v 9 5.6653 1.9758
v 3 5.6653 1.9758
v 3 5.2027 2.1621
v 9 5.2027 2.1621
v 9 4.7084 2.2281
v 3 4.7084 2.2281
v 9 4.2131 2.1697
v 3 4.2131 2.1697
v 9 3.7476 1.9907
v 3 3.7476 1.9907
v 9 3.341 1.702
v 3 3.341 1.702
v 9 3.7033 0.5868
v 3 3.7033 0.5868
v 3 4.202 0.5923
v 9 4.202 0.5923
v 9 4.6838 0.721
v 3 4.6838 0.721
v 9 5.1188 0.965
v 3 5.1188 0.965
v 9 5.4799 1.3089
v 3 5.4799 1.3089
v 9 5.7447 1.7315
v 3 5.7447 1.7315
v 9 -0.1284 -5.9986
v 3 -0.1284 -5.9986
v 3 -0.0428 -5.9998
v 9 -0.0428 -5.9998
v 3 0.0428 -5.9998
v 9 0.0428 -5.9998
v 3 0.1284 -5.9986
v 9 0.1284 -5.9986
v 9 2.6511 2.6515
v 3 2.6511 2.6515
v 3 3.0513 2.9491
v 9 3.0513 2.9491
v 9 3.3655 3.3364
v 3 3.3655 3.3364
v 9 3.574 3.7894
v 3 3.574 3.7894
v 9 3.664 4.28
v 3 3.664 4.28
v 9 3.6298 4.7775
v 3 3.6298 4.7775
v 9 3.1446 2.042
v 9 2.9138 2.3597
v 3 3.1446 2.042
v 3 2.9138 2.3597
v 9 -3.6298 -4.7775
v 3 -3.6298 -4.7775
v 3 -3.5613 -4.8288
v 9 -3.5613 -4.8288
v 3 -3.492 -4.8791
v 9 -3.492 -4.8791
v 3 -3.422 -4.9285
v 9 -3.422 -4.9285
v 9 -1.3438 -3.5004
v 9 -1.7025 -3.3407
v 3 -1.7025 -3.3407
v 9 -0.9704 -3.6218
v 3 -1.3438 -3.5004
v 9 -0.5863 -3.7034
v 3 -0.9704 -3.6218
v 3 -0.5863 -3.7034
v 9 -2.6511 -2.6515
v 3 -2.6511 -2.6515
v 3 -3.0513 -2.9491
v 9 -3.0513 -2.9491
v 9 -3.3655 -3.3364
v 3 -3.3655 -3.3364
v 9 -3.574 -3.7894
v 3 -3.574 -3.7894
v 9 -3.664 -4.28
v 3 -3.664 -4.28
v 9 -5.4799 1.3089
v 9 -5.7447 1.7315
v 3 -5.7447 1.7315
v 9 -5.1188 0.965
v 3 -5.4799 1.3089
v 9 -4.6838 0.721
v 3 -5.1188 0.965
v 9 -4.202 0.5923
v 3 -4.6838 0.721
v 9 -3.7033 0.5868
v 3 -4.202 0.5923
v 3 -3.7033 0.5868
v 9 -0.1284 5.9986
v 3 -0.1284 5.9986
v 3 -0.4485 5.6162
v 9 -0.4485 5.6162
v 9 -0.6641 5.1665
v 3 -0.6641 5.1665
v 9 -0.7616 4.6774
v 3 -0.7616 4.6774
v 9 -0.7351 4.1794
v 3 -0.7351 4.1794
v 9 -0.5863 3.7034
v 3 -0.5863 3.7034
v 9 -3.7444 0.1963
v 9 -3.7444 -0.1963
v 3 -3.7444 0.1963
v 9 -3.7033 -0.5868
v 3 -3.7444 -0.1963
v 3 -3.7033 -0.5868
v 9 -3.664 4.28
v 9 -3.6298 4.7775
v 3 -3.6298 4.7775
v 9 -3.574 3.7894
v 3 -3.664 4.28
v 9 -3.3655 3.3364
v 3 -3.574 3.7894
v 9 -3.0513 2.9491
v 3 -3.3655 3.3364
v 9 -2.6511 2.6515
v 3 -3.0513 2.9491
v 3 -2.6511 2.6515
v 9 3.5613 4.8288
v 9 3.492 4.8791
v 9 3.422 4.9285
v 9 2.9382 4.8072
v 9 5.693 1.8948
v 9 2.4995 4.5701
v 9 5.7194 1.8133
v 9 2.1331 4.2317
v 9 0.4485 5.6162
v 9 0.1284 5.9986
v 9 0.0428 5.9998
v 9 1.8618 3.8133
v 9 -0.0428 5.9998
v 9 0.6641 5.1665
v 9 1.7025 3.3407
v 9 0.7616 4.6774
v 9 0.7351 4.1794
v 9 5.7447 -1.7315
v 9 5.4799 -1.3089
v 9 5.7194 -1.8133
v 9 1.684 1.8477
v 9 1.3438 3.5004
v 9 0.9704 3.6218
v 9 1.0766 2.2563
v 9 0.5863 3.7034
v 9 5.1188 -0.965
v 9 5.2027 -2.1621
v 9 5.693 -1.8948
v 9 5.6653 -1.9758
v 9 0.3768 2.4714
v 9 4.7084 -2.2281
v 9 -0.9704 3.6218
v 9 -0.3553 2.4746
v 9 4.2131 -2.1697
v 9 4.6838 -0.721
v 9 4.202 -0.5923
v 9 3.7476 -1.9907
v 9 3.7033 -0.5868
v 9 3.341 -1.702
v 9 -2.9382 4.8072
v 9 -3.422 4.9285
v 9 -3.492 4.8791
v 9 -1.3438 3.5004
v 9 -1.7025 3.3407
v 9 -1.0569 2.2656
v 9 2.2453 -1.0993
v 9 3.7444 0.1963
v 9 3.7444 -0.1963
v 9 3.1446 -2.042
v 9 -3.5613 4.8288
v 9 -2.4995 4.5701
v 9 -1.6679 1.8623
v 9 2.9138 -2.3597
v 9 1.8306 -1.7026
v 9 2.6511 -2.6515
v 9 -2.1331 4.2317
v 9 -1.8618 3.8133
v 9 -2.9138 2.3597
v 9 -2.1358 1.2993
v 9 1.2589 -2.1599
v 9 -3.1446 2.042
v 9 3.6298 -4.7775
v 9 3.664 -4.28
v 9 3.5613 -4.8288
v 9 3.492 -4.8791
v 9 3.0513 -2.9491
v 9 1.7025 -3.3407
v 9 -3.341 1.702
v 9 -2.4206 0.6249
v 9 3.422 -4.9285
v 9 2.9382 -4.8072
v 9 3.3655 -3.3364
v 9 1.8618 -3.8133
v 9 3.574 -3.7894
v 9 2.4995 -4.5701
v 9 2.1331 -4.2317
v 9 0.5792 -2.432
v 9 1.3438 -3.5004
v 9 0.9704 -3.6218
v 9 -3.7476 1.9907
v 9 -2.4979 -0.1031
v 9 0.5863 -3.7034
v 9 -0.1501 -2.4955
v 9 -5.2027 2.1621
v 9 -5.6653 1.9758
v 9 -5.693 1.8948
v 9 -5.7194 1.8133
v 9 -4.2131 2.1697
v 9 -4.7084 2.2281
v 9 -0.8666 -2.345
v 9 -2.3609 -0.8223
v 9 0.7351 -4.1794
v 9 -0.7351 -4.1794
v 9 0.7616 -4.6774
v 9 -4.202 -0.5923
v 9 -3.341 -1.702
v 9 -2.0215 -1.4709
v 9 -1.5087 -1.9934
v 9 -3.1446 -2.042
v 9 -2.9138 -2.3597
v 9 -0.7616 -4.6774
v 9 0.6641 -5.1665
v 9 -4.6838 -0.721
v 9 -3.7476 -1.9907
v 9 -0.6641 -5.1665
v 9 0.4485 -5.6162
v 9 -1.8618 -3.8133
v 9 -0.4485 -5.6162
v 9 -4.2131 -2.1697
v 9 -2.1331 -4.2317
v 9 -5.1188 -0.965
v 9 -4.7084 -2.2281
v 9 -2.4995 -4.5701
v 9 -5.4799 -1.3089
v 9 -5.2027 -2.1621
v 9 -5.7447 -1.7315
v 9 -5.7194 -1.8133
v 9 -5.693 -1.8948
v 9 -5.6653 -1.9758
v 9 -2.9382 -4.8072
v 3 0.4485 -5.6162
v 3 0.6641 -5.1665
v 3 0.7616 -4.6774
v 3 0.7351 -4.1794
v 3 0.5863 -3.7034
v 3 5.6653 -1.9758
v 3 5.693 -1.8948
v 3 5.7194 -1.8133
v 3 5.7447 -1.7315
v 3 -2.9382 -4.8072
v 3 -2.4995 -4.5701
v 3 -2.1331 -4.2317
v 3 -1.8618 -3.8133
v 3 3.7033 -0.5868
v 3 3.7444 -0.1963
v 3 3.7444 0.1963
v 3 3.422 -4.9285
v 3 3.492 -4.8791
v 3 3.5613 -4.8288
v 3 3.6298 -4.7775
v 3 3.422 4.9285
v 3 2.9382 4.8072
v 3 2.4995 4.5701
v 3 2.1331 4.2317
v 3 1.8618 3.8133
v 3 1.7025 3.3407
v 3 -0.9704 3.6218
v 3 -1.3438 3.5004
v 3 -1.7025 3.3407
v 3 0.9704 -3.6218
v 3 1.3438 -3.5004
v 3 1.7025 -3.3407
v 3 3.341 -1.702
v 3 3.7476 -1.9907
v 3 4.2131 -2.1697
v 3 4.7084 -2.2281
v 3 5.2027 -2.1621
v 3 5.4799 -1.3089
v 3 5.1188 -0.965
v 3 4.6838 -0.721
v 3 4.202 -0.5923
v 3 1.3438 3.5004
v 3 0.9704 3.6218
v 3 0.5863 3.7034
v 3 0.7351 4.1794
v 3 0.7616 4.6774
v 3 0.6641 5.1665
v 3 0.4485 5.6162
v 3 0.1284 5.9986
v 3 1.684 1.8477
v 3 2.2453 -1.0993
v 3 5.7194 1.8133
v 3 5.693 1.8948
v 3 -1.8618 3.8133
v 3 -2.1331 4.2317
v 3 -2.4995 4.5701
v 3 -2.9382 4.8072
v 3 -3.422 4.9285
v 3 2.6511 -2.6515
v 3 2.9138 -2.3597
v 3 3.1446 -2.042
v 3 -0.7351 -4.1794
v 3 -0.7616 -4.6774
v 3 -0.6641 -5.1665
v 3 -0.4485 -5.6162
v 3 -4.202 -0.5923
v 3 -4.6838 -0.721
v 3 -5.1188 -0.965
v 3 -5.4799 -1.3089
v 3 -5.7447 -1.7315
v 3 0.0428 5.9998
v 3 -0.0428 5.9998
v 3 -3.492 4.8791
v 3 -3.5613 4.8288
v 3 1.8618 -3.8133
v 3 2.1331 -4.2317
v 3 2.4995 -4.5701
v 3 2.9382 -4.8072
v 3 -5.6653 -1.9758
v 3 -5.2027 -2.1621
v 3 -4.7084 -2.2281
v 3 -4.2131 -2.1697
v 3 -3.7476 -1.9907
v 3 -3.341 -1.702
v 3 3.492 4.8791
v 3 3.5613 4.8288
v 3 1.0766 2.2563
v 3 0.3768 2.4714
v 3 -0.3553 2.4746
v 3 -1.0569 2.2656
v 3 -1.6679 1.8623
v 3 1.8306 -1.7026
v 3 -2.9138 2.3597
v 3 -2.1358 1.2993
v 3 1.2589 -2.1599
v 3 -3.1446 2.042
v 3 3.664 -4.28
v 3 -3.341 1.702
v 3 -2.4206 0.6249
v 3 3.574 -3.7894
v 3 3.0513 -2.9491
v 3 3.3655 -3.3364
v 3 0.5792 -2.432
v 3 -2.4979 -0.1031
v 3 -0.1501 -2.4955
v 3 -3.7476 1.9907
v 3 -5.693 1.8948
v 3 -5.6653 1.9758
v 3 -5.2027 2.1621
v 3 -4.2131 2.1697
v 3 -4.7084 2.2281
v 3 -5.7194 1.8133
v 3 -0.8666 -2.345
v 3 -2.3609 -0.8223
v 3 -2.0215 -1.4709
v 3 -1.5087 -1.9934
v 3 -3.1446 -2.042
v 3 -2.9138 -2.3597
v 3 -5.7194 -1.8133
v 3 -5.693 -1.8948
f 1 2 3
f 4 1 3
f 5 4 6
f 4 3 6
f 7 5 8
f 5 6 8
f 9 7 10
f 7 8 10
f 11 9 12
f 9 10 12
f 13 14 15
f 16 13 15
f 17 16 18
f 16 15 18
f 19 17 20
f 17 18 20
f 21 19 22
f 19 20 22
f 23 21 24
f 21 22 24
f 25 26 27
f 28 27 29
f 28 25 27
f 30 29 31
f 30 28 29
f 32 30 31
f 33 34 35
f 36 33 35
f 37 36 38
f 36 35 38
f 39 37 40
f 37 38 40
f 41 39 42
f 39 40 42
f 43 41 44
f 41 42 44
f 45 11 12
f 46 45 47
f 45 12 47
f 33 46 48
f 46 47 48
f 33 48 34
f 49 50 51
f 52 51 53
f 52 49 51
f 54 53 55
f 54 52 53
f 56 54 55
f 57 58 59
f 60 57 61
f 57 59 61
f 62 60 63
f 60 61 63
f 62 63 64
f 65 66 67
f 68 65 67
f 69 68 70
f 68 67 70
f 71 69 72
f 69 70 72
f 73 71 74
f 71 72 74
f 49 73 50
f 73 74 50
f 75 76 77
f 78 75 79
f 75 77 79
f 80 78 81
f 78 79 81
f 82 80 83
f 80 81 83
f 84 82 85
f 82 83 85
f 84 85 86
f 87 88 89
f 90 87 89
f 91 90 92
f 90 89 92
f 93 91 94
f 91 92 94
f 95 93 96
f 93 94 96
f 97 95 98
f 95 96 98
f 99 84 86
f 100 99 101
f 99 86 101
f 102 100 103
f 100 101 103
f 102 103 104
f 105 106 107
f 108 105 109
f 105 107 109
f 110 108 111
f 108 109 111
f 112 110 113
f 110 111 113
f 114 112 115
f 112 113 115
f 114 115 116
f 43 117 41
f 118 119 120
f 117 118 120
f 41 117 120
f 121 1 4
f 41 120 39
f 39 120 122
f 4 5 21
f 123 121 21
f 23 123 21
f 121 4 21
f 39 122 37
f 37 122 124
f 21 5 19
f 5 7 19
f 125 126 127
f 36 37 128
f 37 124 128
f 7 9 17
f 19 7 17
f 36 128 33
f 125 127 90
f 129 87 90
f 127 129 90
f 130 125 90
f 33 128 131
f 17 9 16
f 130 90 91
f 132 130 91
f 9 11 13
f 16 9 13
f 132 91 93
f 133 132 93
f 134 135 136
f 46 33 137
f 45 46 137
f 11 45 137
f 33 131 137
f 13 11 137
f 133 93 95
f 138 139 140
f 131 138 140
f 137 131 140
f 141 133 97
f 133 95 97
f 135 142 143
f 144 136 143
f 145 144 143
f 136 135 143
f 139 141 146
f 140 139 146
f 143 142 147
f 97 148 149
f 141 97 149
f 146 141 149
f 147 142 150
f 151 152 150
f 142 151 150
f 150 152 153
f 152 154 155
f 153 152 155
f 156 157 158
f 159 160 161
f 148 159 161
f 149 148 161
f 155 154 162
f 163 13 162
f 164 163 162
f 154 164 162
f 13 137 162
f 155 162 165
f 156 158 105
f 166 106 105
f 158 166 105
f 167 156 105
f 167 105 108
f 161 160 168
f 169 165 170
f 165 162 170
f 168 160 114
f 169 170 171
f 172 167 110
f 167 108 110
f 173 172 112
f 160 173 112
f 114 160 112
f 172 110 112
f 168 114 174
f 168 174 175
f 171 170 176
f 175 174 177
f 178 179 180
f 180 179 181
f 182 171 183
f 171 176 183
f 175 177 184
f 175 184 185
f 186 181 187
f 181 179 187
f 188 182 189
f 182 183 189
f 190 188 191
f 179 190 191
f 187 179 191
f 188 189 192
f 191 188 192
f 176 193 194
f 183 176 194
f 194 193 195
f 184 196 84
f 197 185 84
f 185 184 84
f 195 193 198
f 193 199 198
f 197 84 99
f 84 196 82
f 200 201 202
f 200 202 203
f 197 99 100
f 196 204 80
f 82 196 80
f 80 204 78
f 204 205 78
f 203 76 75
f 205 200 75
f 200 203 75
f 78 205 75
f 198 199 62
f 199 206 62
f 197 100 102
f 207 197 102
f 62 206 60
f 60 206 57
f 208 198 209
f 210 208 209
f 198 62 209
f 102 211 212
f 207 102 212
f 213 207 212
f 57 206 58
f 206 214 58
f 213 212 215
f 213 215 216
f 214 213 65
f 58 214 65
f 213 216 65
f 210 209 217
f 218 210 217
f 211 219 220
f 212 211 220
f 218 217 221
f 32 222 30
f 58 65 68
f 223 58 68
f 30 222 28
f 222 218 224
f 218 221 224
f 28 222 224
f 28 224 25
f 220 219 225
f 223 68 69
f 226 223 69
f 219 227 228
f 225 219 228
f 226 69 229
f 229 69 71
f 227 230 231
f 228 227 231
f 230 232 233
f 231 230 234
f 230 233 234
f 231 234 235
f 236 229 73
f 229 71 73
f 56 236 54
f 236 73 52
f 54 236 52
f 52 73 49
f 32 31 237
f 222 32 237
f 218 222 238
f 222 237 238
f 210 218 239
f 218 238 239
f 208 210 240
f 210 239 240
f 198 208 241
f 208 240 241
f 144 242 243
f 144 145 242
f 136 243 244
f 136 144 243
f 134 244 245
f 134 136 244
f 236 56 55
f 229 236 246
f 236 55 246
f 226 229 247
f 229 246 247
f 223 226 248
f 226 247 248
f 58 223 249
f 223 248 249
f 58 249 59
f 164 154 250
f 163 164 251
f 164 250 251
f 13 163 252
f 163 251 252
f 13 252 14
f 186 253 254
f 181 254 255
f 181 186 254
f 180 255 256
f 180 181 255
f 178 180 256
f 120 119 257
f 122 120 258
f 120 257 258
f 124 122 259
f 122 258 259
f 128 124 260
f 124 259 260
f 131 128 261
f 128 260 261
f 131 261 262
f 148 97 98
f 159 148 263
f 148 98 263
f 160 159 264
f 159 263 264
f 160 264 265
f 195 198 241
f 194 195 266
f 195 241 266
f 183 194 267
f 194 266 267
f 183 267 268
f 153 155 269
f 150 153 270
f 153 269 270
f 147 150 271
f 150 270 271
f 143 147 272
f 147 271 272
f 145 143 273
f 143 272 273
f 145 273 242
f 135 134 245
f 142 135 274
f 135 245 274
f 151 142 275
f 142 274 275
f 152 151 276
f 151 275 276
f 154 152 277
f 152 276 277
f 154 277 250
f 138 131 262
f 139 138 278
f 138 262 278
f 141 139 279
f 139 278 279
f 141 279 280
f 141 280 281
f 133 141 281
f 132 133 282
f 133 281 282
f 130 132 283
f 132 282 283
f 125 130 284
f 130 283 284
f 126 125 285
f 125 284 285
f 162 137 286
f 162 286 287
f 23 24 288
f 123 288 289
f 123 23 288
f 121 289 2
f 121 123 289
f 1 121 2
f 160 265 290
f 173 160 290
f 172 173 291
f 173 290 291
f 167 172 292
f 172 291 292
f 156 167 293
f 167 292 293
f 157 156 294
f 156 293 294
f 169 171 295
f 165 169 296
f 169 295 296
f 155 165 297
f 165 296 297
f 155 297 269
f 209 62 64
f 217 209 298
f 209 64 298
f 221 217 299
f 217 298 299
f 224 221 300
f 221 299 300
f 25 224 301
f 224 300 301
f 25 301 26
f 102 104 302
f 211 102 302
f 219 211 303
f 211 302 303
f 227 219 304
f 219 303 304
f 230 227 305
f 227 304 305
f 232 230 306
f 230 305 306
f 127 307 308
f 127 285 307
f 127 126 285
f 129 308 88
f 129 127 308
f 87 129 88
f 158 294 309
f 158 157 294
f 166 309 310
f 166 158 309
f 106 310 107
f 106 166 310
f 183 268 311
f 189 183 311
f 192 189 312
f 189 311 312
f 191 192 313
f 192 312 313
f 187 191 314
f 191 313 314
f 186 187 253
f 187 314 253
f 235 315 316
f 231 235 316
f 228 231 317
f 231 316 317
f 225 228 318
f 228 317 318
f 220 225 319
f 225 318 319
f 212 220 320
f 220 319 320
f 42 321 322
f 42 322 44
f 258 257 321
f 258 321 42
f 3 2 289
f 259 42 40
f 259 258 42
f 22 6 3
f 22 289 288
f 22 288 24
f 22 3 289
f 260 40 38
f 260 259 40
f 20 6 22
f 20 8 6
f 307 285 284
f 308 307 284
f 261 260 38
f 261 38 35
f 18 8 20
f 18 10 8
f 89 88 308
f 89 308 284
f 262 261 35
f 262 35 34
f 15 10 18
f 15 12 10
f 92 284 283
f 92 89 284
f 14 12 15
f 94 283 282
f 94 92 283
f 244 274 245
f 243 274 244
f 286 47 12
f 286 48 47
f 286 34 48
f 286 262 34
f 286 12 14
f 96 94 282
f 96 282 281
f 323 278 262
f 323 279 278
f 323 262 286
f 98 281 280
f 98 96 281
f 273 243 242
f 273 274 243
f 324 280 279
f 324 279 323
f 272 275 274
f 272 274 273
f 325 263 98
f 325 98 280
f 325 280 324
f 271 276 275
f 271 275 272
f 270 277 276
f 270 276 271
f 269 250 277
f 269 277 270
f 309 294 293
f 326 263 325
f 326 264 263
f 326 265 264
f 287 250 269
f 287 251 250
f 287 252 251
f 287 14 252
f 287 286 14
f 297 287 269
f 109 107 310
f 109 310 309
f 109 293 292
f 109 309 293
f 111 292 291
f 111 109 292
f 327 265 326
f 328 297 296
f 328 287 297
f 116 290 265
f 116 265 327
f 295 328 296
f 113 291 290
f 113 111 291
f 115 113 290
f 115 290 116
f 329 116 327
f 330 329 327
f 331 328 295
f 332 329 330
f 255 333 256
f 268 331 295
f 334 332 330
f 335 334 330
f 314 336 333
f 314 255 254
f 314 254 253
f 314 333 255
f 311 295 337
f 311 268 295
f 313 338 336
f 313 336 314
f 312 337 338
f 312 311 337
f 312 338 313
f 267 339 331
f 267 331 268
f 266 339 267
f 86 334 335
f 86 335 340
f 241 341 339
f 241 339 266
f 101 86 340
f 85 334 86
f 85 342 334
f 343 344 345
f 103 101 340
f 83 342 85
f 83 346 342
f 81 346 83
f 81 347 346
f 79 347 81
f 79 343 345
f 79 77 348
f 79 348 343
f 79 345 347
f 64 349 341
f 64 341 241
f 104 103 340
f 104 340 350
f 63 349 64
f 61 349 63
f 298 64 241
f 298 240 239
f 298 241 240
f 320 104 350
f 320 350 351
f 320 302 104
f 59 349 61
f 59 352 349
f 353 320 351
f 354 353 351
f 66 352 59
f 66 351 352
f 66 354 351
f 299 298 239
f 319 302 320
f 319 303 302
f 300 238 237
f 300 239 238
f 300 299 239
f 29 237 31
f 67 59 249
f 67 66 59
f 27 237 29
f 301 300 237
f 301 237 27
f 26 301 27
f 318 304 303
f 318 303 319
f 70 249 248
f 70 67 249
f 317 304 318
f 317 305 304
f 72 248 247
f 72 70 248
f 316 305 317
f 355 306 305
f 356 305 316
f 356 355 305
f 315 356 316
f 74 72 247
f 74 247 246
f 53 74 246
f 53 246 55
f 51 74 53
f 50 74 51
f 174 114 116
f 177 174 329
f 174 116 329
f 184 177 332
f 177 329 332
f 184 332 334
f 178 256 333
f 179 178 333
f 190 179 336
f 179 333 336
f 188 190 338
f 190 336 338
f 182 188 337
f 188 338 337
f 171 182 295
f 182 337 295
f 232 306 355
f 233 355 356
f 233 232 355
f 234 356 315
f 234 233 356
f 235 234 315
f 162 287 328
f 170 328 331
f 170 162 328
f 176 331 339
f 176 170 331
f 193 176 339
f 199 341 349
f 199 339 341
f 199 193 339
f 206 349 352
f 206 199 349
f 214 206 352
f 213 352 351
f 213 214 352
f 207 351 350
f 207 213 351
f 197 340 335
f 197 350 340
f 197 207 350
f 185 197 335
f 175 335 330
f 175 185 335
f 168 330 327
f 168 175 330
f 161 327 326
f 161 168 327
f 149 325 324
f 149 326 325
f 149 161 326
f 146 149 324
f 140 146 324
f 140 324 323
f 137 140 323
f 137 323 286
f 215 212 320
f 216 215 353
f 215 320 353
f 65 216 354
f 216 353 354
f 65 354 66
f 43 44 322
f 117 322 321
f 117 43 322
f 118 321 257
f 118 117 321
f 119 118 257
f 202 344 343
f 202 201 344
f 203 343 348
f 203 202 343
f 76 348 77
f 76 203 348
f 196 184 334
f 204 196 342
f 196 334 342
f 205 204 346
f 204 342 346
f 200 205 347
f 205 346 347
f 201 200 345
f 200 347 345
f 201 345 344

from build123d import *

# Parameters (mm, degrees)
BASPROSKE_W        = 12
BASPROSKE_H        = 12
TOOTHCUT_DEPTH     = 21.784609691
TEETHCUTS_COUNT    = 10
TEETHCUTS_ANGLE    = 324
BORSKE_R           = 0.4
BORE_DEPTH         = 50.0000508
SCALE1_SCALE       = 0.5
CUT_EXTRUDE1_DEPTH = 11.2470399


with BuildPart() as part:
    # BasProSke → Base-Revolve (revolve)
    with BuildSketch(Plane(origin=(0, 0, 0), x_dir=(1, 0, 0), z_dir=(0, 1, 0)), mode=Mode.PRIVATE) as base_revolve_sk:
        with Locations((6, 6)):
            Rectangle(BASPROSKE_W, BASPROSKE_H)
    revolve(base_revolve_sk.sketch.rotate(Axis((-10, 0, 0), (1, 0, 0)), 180), axis=Axis((-10, 0, 0), (1, 0, 0)))

    # TooCutSke → ToothCut (cut, through all)
    with BuildSketch(Plane(origin=(0, 0, 0), x_dir=(0, 0, -1), z_dir=(1, 0, 0))):
        with BuildLine():
            ThreePointArc((1.173662691, 7.406586048), (0, 7.499), (-1.173662691, 7.406586048))
            ThreePointArc((-1.173662691, 7.406586048), (-1.668191438, 9.834565786), (-3.497907776, 11.50542856))
            ThreePointArc((-3.497907776, 11.50542856), (0, 12.0254), (3.497907776, 11.50542856))
            ThreePointArc((3.497907776, 11.50542856), (1.668191438, 9.834565786), (1.173662691, 7.406586048))
        make_face()
    toothcut = extrude(amount=TOOTHCUT_DEPTH, mode=Mode.SUBTRACT)

    # TeethCuts: ToothCut ×10 about axis
    teethcuts_axis = Axis((-10, 0, 0), (1, 0, 0))
    for i in range(1, TEETHCUTS_COUNT):
        add(toothcut.rotate(teethcuts_axis, i * TEETHCUTS_ANGLE / (TEETHCUTS_COUNT - 1)), mode=Mode.SUBTRACT)

    # BorSke → Bore (cut, symmetric)
    with BuildSketch(Plane(origin=(0, 0, 0), x_dir=(0, 0, -1), z_dir=(1, 0, 0))):
        with Locations(Location((0, 0, 0), (0, 0, 180))):
            Circle(BORSKE_R)
    extrude(amount=BORE_DEPTH, both=True, mode=Mode.SUBTRACT)


with BuildPart() as part_1:
    # Scale1: scaled about (6, 0, 0)
    add(part.part.scale(SCALE1_SCALE).moved(Location((3, 0, 0))))

    # Sketch2 → Cut-Extrude1 (cut, through all)
    with BuildSketch(Plane(origin=(9, 0, 0), x_dir=(0, 0, -1), z_dir=(1, 0, 0))):
        with BuildLine():
            Line((-1.84770017, 1.684043967), (1.09932616, 2.245324474))
            ThreePointArc((1.09932616, 2.245324474), (0.467733756, -2.455855275), (-1.84770017, 1.684043967))
        make_face()
    extrude(amount=-CUT_EXTRUDE1_DEPTH, mode=Mode.SUBTRACT)


solid = part_1.part
